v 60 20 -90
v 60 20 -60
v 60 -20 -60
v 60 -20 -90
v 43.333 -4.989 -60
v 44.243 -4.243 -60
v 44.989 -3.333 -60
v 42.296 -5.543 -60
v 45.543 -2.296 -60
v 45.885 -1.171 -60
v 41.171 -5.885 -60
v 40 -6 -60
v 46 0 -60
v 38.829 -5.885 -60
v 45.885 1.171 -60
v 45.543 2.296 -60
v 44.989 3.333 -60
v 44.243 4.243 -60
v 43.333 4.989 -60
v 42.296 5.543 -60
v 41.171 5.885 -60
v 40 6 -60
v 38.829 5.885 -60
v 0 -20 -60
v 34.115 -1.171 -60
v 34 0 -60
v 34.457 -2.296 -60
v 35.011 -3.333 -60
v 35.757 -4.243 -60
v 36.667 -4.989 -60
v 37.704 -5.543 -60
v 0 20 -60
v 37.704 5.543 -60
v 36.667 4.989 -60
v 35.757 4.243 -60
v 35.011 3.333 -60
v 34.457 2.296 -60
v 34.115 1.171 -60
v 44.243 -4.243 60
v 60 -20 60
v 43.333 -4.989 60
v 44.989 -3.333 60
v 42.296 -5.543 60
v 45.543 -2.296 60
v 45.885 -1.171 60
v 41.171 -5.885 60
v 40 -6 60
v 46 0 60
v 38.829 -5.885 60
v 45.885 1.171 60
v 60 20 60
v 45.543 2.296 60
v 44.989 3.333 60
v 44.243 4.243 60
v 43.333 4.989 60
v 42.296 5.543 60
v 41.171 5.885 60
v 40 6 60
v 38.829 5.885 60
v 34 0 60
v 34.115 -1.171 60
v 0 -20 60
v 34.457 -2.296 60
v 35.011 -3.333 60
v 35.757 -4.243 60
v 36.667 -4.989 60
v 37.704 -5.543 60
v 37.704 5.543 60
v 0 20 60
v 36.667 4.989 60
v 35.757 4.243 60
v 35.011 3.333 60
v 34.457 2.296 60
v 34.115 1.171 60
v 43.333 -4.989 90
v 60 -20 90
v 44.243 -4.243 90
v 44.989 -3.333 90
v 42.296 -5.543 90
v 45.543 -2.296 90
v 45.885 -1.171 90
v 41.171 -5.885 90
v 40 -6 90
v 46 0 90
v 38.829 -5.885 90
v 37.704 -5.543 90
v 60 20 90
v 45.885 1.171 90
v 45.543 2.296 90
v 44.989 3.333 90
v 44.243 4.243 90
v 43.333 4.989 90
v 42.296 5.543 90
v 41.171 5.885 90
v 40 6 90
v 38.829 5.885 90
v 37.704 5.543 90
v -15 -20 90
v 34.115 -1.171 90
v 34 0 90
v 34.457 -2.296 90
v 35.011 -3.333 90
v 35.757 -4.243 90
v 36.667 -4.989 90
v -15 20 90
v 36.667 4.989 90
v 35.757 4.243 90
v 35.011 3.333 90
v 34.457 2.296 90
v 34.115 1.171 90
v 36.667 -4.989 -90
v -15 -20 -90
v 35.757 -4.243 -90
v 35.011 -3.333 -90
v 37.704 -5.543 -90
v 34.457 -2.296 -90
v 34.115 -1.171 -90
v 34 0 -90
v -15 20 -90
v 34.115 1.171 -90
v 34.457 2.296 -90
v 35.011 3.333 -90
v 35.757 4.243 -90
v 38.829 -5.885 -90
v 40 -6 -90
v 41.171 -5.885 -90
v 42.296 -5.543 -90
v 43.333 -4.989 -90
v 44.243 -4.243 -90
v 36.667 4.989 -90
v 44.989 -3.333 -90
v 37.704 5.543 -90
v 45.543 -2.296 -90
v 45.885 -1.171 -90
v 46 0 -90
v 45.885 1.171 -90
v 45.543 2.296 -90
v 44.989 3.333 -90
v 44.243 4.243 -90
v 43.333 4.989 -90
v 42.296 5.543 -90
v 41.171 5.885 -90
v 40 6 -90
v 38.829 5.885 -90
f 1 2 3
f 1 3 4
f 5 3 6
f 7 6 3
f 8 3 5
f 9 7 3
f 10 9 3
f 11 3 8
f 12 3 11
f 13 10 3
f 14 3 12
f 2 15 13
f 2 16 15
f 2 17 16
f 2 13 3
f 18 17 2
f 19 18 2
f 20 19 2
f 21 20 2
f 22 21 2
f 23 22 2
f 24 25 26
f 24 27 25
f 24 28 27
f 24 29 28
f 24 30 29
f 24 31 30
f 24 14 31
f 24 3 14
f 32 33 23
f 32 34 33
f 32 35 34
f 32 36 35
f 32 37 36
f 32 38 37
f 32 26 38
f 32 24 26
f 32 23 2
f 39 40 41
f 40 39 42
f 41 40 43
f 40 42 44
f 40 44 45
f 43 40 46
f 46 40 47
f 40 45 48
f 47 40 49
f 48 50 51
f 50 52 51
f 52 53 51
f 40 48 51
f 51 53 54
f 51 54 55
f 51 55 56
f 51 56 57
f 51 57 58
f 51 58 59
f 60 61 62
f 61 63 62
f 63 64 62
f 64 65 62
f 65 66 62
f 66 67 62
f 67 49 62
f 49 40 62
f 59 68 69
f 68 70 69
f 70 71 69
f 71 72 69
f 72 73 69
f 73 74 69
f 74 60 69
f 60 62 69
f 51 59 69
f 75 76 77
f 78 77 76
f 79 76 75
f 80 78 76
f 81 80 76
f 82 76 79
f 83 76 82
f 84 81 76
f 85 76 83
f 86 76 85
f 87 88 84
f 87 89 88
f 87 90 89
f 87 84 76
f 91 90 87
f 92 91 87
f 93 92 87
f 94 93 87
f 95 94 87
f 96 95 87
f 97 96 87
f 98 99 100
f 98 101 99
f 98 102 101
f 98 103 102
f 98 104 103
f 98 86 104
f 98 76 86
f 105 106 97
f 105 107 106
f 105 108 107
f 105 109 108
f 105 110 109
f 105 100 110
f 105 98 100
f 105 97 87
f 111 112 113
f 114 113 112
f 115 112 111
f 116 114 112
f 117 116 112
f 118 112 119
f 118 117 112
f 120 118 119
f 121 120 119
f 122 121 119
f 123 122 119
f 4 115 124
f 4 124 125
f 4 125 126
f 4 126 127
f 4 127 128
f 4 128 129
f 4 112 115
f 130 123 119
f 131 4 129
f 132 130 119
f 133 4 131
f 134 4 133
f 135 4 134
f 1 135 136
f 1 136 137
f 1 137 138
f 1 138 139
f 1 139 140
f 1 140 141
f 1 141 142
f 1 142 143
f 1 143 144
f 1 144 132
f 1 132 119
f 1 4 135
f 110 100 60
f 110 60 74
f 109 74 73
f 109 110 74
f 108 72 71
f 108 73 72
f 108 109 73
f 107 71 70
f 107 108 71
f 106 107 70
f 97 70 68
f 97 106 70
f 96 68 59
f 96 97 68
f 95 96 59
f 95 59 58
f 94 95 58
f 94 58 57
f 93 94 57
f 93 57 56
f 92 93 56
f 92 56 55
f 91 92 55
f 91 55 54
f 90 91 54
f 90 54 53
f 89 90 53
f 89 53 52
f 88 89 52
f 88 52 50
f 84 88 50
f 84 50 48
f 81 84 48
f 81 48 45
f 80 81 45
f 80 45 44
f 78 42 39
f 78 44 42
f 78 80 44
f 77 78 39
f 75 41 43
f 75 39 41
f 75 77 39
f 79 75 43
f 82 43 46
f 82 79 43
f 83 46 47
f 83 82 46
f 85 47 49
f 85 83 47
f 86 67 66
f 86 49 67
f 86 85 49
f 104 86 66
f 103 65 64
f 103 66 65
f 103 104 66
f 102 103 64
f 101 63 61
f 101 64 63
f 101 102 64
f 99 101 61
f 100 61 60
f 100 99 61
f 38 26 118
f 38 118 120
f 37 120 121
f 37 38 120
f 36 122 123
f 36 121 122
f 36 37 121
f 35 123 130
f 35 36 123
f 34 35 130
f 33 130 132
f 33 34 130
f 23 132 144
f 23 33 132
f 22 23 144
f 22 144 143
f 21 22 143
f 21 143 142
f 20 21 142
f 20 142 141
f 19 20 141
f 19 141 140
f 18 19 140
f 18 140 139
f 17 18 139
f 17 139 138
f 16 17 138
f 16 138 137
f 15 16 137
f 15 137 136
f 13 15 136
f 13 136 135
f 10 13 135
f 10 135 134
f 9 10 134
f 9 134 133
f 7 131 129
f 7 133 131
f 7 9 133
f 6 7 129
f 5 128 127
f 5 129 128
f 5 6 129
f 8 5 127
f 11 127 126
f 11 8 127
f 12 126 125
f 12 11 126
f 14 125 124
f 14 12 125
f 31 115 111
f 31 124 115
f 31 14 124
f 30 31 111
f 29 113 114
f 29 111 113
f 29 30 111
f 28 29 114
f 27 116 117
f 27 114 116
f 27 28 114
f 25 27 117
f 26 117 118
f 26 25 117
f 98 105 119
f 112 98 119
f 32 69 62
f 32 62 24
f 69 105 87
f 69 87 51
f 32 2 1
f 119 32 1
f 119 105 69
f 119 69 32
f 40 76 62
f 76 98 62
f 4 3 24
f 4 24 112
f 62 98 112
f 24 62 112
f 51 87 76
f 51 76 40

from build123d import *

# Parameters (mm, degrees)
SKETCH1_W               = 180
SKETCH1_H               = 40
BOSS_EXTRUDE1_DEPTH     = 15
SKETCH1_3_W             = 30
SKETCH1_3_H             = 40
BOSS_EXTRUDE2_DEPTH     = 60
CUT_EXTRUDE1_DEPTH      = 163.788205961
CUT_EXTRUDE1_DEPTH_BACK = 163.788205961
SKETCH2_R               = 6


with BuildPart() as part:
    # Sketch1 → Boss-Extrude1 (new body)
    with BuildSketch(Plane(origin=(0, 0, 0), x_dir=(0, 0, -1), z_dir=(1, 0, 0))):
        Rectangle(SKETCH1_W, SKETCH1_H)
    extrude(amount=-BOSS_EXTRUDE1_DEPTH)

    # Sketch1<3> → Boss-Extrude2 (add)
    with BuildSketch(Plane(origin=(0, 0, 0), x_dir=(0, 0, -1), z_dir=(1, 0, 0))):
        with Locations((-75, 0)):
            Rectangle(SKETCH1_3_W, SKETCH1_3_H)
        with Locations((75, 0)):
            Rectangle(SKETCH1_3_W, SKETCH1_3_H)
    extrude(amount=BOSS_EXTRUDE2_DEPTH)

    # Sketch2 → Cut-Extrude1 (cut, two sides: drawn at the far end of the back side and taken through both)
    with BuildSketch(Plane(origin=(0, 0, 60), x_dir=(-1, 0, 0), z_dir=(0, 0, -1)).offset(-CUT_EXTRUDE1_DEPTH_BACK)):
        with Locations((-40, 0)):
            Circle(SKETCH2_R)
    extrude(amount=CUT_EXTRUDE1_DEPTH + CUT_EXTRUDE1_DEPTH_BACK, mode=Mode.SUBTRACT)


solid = part.part
